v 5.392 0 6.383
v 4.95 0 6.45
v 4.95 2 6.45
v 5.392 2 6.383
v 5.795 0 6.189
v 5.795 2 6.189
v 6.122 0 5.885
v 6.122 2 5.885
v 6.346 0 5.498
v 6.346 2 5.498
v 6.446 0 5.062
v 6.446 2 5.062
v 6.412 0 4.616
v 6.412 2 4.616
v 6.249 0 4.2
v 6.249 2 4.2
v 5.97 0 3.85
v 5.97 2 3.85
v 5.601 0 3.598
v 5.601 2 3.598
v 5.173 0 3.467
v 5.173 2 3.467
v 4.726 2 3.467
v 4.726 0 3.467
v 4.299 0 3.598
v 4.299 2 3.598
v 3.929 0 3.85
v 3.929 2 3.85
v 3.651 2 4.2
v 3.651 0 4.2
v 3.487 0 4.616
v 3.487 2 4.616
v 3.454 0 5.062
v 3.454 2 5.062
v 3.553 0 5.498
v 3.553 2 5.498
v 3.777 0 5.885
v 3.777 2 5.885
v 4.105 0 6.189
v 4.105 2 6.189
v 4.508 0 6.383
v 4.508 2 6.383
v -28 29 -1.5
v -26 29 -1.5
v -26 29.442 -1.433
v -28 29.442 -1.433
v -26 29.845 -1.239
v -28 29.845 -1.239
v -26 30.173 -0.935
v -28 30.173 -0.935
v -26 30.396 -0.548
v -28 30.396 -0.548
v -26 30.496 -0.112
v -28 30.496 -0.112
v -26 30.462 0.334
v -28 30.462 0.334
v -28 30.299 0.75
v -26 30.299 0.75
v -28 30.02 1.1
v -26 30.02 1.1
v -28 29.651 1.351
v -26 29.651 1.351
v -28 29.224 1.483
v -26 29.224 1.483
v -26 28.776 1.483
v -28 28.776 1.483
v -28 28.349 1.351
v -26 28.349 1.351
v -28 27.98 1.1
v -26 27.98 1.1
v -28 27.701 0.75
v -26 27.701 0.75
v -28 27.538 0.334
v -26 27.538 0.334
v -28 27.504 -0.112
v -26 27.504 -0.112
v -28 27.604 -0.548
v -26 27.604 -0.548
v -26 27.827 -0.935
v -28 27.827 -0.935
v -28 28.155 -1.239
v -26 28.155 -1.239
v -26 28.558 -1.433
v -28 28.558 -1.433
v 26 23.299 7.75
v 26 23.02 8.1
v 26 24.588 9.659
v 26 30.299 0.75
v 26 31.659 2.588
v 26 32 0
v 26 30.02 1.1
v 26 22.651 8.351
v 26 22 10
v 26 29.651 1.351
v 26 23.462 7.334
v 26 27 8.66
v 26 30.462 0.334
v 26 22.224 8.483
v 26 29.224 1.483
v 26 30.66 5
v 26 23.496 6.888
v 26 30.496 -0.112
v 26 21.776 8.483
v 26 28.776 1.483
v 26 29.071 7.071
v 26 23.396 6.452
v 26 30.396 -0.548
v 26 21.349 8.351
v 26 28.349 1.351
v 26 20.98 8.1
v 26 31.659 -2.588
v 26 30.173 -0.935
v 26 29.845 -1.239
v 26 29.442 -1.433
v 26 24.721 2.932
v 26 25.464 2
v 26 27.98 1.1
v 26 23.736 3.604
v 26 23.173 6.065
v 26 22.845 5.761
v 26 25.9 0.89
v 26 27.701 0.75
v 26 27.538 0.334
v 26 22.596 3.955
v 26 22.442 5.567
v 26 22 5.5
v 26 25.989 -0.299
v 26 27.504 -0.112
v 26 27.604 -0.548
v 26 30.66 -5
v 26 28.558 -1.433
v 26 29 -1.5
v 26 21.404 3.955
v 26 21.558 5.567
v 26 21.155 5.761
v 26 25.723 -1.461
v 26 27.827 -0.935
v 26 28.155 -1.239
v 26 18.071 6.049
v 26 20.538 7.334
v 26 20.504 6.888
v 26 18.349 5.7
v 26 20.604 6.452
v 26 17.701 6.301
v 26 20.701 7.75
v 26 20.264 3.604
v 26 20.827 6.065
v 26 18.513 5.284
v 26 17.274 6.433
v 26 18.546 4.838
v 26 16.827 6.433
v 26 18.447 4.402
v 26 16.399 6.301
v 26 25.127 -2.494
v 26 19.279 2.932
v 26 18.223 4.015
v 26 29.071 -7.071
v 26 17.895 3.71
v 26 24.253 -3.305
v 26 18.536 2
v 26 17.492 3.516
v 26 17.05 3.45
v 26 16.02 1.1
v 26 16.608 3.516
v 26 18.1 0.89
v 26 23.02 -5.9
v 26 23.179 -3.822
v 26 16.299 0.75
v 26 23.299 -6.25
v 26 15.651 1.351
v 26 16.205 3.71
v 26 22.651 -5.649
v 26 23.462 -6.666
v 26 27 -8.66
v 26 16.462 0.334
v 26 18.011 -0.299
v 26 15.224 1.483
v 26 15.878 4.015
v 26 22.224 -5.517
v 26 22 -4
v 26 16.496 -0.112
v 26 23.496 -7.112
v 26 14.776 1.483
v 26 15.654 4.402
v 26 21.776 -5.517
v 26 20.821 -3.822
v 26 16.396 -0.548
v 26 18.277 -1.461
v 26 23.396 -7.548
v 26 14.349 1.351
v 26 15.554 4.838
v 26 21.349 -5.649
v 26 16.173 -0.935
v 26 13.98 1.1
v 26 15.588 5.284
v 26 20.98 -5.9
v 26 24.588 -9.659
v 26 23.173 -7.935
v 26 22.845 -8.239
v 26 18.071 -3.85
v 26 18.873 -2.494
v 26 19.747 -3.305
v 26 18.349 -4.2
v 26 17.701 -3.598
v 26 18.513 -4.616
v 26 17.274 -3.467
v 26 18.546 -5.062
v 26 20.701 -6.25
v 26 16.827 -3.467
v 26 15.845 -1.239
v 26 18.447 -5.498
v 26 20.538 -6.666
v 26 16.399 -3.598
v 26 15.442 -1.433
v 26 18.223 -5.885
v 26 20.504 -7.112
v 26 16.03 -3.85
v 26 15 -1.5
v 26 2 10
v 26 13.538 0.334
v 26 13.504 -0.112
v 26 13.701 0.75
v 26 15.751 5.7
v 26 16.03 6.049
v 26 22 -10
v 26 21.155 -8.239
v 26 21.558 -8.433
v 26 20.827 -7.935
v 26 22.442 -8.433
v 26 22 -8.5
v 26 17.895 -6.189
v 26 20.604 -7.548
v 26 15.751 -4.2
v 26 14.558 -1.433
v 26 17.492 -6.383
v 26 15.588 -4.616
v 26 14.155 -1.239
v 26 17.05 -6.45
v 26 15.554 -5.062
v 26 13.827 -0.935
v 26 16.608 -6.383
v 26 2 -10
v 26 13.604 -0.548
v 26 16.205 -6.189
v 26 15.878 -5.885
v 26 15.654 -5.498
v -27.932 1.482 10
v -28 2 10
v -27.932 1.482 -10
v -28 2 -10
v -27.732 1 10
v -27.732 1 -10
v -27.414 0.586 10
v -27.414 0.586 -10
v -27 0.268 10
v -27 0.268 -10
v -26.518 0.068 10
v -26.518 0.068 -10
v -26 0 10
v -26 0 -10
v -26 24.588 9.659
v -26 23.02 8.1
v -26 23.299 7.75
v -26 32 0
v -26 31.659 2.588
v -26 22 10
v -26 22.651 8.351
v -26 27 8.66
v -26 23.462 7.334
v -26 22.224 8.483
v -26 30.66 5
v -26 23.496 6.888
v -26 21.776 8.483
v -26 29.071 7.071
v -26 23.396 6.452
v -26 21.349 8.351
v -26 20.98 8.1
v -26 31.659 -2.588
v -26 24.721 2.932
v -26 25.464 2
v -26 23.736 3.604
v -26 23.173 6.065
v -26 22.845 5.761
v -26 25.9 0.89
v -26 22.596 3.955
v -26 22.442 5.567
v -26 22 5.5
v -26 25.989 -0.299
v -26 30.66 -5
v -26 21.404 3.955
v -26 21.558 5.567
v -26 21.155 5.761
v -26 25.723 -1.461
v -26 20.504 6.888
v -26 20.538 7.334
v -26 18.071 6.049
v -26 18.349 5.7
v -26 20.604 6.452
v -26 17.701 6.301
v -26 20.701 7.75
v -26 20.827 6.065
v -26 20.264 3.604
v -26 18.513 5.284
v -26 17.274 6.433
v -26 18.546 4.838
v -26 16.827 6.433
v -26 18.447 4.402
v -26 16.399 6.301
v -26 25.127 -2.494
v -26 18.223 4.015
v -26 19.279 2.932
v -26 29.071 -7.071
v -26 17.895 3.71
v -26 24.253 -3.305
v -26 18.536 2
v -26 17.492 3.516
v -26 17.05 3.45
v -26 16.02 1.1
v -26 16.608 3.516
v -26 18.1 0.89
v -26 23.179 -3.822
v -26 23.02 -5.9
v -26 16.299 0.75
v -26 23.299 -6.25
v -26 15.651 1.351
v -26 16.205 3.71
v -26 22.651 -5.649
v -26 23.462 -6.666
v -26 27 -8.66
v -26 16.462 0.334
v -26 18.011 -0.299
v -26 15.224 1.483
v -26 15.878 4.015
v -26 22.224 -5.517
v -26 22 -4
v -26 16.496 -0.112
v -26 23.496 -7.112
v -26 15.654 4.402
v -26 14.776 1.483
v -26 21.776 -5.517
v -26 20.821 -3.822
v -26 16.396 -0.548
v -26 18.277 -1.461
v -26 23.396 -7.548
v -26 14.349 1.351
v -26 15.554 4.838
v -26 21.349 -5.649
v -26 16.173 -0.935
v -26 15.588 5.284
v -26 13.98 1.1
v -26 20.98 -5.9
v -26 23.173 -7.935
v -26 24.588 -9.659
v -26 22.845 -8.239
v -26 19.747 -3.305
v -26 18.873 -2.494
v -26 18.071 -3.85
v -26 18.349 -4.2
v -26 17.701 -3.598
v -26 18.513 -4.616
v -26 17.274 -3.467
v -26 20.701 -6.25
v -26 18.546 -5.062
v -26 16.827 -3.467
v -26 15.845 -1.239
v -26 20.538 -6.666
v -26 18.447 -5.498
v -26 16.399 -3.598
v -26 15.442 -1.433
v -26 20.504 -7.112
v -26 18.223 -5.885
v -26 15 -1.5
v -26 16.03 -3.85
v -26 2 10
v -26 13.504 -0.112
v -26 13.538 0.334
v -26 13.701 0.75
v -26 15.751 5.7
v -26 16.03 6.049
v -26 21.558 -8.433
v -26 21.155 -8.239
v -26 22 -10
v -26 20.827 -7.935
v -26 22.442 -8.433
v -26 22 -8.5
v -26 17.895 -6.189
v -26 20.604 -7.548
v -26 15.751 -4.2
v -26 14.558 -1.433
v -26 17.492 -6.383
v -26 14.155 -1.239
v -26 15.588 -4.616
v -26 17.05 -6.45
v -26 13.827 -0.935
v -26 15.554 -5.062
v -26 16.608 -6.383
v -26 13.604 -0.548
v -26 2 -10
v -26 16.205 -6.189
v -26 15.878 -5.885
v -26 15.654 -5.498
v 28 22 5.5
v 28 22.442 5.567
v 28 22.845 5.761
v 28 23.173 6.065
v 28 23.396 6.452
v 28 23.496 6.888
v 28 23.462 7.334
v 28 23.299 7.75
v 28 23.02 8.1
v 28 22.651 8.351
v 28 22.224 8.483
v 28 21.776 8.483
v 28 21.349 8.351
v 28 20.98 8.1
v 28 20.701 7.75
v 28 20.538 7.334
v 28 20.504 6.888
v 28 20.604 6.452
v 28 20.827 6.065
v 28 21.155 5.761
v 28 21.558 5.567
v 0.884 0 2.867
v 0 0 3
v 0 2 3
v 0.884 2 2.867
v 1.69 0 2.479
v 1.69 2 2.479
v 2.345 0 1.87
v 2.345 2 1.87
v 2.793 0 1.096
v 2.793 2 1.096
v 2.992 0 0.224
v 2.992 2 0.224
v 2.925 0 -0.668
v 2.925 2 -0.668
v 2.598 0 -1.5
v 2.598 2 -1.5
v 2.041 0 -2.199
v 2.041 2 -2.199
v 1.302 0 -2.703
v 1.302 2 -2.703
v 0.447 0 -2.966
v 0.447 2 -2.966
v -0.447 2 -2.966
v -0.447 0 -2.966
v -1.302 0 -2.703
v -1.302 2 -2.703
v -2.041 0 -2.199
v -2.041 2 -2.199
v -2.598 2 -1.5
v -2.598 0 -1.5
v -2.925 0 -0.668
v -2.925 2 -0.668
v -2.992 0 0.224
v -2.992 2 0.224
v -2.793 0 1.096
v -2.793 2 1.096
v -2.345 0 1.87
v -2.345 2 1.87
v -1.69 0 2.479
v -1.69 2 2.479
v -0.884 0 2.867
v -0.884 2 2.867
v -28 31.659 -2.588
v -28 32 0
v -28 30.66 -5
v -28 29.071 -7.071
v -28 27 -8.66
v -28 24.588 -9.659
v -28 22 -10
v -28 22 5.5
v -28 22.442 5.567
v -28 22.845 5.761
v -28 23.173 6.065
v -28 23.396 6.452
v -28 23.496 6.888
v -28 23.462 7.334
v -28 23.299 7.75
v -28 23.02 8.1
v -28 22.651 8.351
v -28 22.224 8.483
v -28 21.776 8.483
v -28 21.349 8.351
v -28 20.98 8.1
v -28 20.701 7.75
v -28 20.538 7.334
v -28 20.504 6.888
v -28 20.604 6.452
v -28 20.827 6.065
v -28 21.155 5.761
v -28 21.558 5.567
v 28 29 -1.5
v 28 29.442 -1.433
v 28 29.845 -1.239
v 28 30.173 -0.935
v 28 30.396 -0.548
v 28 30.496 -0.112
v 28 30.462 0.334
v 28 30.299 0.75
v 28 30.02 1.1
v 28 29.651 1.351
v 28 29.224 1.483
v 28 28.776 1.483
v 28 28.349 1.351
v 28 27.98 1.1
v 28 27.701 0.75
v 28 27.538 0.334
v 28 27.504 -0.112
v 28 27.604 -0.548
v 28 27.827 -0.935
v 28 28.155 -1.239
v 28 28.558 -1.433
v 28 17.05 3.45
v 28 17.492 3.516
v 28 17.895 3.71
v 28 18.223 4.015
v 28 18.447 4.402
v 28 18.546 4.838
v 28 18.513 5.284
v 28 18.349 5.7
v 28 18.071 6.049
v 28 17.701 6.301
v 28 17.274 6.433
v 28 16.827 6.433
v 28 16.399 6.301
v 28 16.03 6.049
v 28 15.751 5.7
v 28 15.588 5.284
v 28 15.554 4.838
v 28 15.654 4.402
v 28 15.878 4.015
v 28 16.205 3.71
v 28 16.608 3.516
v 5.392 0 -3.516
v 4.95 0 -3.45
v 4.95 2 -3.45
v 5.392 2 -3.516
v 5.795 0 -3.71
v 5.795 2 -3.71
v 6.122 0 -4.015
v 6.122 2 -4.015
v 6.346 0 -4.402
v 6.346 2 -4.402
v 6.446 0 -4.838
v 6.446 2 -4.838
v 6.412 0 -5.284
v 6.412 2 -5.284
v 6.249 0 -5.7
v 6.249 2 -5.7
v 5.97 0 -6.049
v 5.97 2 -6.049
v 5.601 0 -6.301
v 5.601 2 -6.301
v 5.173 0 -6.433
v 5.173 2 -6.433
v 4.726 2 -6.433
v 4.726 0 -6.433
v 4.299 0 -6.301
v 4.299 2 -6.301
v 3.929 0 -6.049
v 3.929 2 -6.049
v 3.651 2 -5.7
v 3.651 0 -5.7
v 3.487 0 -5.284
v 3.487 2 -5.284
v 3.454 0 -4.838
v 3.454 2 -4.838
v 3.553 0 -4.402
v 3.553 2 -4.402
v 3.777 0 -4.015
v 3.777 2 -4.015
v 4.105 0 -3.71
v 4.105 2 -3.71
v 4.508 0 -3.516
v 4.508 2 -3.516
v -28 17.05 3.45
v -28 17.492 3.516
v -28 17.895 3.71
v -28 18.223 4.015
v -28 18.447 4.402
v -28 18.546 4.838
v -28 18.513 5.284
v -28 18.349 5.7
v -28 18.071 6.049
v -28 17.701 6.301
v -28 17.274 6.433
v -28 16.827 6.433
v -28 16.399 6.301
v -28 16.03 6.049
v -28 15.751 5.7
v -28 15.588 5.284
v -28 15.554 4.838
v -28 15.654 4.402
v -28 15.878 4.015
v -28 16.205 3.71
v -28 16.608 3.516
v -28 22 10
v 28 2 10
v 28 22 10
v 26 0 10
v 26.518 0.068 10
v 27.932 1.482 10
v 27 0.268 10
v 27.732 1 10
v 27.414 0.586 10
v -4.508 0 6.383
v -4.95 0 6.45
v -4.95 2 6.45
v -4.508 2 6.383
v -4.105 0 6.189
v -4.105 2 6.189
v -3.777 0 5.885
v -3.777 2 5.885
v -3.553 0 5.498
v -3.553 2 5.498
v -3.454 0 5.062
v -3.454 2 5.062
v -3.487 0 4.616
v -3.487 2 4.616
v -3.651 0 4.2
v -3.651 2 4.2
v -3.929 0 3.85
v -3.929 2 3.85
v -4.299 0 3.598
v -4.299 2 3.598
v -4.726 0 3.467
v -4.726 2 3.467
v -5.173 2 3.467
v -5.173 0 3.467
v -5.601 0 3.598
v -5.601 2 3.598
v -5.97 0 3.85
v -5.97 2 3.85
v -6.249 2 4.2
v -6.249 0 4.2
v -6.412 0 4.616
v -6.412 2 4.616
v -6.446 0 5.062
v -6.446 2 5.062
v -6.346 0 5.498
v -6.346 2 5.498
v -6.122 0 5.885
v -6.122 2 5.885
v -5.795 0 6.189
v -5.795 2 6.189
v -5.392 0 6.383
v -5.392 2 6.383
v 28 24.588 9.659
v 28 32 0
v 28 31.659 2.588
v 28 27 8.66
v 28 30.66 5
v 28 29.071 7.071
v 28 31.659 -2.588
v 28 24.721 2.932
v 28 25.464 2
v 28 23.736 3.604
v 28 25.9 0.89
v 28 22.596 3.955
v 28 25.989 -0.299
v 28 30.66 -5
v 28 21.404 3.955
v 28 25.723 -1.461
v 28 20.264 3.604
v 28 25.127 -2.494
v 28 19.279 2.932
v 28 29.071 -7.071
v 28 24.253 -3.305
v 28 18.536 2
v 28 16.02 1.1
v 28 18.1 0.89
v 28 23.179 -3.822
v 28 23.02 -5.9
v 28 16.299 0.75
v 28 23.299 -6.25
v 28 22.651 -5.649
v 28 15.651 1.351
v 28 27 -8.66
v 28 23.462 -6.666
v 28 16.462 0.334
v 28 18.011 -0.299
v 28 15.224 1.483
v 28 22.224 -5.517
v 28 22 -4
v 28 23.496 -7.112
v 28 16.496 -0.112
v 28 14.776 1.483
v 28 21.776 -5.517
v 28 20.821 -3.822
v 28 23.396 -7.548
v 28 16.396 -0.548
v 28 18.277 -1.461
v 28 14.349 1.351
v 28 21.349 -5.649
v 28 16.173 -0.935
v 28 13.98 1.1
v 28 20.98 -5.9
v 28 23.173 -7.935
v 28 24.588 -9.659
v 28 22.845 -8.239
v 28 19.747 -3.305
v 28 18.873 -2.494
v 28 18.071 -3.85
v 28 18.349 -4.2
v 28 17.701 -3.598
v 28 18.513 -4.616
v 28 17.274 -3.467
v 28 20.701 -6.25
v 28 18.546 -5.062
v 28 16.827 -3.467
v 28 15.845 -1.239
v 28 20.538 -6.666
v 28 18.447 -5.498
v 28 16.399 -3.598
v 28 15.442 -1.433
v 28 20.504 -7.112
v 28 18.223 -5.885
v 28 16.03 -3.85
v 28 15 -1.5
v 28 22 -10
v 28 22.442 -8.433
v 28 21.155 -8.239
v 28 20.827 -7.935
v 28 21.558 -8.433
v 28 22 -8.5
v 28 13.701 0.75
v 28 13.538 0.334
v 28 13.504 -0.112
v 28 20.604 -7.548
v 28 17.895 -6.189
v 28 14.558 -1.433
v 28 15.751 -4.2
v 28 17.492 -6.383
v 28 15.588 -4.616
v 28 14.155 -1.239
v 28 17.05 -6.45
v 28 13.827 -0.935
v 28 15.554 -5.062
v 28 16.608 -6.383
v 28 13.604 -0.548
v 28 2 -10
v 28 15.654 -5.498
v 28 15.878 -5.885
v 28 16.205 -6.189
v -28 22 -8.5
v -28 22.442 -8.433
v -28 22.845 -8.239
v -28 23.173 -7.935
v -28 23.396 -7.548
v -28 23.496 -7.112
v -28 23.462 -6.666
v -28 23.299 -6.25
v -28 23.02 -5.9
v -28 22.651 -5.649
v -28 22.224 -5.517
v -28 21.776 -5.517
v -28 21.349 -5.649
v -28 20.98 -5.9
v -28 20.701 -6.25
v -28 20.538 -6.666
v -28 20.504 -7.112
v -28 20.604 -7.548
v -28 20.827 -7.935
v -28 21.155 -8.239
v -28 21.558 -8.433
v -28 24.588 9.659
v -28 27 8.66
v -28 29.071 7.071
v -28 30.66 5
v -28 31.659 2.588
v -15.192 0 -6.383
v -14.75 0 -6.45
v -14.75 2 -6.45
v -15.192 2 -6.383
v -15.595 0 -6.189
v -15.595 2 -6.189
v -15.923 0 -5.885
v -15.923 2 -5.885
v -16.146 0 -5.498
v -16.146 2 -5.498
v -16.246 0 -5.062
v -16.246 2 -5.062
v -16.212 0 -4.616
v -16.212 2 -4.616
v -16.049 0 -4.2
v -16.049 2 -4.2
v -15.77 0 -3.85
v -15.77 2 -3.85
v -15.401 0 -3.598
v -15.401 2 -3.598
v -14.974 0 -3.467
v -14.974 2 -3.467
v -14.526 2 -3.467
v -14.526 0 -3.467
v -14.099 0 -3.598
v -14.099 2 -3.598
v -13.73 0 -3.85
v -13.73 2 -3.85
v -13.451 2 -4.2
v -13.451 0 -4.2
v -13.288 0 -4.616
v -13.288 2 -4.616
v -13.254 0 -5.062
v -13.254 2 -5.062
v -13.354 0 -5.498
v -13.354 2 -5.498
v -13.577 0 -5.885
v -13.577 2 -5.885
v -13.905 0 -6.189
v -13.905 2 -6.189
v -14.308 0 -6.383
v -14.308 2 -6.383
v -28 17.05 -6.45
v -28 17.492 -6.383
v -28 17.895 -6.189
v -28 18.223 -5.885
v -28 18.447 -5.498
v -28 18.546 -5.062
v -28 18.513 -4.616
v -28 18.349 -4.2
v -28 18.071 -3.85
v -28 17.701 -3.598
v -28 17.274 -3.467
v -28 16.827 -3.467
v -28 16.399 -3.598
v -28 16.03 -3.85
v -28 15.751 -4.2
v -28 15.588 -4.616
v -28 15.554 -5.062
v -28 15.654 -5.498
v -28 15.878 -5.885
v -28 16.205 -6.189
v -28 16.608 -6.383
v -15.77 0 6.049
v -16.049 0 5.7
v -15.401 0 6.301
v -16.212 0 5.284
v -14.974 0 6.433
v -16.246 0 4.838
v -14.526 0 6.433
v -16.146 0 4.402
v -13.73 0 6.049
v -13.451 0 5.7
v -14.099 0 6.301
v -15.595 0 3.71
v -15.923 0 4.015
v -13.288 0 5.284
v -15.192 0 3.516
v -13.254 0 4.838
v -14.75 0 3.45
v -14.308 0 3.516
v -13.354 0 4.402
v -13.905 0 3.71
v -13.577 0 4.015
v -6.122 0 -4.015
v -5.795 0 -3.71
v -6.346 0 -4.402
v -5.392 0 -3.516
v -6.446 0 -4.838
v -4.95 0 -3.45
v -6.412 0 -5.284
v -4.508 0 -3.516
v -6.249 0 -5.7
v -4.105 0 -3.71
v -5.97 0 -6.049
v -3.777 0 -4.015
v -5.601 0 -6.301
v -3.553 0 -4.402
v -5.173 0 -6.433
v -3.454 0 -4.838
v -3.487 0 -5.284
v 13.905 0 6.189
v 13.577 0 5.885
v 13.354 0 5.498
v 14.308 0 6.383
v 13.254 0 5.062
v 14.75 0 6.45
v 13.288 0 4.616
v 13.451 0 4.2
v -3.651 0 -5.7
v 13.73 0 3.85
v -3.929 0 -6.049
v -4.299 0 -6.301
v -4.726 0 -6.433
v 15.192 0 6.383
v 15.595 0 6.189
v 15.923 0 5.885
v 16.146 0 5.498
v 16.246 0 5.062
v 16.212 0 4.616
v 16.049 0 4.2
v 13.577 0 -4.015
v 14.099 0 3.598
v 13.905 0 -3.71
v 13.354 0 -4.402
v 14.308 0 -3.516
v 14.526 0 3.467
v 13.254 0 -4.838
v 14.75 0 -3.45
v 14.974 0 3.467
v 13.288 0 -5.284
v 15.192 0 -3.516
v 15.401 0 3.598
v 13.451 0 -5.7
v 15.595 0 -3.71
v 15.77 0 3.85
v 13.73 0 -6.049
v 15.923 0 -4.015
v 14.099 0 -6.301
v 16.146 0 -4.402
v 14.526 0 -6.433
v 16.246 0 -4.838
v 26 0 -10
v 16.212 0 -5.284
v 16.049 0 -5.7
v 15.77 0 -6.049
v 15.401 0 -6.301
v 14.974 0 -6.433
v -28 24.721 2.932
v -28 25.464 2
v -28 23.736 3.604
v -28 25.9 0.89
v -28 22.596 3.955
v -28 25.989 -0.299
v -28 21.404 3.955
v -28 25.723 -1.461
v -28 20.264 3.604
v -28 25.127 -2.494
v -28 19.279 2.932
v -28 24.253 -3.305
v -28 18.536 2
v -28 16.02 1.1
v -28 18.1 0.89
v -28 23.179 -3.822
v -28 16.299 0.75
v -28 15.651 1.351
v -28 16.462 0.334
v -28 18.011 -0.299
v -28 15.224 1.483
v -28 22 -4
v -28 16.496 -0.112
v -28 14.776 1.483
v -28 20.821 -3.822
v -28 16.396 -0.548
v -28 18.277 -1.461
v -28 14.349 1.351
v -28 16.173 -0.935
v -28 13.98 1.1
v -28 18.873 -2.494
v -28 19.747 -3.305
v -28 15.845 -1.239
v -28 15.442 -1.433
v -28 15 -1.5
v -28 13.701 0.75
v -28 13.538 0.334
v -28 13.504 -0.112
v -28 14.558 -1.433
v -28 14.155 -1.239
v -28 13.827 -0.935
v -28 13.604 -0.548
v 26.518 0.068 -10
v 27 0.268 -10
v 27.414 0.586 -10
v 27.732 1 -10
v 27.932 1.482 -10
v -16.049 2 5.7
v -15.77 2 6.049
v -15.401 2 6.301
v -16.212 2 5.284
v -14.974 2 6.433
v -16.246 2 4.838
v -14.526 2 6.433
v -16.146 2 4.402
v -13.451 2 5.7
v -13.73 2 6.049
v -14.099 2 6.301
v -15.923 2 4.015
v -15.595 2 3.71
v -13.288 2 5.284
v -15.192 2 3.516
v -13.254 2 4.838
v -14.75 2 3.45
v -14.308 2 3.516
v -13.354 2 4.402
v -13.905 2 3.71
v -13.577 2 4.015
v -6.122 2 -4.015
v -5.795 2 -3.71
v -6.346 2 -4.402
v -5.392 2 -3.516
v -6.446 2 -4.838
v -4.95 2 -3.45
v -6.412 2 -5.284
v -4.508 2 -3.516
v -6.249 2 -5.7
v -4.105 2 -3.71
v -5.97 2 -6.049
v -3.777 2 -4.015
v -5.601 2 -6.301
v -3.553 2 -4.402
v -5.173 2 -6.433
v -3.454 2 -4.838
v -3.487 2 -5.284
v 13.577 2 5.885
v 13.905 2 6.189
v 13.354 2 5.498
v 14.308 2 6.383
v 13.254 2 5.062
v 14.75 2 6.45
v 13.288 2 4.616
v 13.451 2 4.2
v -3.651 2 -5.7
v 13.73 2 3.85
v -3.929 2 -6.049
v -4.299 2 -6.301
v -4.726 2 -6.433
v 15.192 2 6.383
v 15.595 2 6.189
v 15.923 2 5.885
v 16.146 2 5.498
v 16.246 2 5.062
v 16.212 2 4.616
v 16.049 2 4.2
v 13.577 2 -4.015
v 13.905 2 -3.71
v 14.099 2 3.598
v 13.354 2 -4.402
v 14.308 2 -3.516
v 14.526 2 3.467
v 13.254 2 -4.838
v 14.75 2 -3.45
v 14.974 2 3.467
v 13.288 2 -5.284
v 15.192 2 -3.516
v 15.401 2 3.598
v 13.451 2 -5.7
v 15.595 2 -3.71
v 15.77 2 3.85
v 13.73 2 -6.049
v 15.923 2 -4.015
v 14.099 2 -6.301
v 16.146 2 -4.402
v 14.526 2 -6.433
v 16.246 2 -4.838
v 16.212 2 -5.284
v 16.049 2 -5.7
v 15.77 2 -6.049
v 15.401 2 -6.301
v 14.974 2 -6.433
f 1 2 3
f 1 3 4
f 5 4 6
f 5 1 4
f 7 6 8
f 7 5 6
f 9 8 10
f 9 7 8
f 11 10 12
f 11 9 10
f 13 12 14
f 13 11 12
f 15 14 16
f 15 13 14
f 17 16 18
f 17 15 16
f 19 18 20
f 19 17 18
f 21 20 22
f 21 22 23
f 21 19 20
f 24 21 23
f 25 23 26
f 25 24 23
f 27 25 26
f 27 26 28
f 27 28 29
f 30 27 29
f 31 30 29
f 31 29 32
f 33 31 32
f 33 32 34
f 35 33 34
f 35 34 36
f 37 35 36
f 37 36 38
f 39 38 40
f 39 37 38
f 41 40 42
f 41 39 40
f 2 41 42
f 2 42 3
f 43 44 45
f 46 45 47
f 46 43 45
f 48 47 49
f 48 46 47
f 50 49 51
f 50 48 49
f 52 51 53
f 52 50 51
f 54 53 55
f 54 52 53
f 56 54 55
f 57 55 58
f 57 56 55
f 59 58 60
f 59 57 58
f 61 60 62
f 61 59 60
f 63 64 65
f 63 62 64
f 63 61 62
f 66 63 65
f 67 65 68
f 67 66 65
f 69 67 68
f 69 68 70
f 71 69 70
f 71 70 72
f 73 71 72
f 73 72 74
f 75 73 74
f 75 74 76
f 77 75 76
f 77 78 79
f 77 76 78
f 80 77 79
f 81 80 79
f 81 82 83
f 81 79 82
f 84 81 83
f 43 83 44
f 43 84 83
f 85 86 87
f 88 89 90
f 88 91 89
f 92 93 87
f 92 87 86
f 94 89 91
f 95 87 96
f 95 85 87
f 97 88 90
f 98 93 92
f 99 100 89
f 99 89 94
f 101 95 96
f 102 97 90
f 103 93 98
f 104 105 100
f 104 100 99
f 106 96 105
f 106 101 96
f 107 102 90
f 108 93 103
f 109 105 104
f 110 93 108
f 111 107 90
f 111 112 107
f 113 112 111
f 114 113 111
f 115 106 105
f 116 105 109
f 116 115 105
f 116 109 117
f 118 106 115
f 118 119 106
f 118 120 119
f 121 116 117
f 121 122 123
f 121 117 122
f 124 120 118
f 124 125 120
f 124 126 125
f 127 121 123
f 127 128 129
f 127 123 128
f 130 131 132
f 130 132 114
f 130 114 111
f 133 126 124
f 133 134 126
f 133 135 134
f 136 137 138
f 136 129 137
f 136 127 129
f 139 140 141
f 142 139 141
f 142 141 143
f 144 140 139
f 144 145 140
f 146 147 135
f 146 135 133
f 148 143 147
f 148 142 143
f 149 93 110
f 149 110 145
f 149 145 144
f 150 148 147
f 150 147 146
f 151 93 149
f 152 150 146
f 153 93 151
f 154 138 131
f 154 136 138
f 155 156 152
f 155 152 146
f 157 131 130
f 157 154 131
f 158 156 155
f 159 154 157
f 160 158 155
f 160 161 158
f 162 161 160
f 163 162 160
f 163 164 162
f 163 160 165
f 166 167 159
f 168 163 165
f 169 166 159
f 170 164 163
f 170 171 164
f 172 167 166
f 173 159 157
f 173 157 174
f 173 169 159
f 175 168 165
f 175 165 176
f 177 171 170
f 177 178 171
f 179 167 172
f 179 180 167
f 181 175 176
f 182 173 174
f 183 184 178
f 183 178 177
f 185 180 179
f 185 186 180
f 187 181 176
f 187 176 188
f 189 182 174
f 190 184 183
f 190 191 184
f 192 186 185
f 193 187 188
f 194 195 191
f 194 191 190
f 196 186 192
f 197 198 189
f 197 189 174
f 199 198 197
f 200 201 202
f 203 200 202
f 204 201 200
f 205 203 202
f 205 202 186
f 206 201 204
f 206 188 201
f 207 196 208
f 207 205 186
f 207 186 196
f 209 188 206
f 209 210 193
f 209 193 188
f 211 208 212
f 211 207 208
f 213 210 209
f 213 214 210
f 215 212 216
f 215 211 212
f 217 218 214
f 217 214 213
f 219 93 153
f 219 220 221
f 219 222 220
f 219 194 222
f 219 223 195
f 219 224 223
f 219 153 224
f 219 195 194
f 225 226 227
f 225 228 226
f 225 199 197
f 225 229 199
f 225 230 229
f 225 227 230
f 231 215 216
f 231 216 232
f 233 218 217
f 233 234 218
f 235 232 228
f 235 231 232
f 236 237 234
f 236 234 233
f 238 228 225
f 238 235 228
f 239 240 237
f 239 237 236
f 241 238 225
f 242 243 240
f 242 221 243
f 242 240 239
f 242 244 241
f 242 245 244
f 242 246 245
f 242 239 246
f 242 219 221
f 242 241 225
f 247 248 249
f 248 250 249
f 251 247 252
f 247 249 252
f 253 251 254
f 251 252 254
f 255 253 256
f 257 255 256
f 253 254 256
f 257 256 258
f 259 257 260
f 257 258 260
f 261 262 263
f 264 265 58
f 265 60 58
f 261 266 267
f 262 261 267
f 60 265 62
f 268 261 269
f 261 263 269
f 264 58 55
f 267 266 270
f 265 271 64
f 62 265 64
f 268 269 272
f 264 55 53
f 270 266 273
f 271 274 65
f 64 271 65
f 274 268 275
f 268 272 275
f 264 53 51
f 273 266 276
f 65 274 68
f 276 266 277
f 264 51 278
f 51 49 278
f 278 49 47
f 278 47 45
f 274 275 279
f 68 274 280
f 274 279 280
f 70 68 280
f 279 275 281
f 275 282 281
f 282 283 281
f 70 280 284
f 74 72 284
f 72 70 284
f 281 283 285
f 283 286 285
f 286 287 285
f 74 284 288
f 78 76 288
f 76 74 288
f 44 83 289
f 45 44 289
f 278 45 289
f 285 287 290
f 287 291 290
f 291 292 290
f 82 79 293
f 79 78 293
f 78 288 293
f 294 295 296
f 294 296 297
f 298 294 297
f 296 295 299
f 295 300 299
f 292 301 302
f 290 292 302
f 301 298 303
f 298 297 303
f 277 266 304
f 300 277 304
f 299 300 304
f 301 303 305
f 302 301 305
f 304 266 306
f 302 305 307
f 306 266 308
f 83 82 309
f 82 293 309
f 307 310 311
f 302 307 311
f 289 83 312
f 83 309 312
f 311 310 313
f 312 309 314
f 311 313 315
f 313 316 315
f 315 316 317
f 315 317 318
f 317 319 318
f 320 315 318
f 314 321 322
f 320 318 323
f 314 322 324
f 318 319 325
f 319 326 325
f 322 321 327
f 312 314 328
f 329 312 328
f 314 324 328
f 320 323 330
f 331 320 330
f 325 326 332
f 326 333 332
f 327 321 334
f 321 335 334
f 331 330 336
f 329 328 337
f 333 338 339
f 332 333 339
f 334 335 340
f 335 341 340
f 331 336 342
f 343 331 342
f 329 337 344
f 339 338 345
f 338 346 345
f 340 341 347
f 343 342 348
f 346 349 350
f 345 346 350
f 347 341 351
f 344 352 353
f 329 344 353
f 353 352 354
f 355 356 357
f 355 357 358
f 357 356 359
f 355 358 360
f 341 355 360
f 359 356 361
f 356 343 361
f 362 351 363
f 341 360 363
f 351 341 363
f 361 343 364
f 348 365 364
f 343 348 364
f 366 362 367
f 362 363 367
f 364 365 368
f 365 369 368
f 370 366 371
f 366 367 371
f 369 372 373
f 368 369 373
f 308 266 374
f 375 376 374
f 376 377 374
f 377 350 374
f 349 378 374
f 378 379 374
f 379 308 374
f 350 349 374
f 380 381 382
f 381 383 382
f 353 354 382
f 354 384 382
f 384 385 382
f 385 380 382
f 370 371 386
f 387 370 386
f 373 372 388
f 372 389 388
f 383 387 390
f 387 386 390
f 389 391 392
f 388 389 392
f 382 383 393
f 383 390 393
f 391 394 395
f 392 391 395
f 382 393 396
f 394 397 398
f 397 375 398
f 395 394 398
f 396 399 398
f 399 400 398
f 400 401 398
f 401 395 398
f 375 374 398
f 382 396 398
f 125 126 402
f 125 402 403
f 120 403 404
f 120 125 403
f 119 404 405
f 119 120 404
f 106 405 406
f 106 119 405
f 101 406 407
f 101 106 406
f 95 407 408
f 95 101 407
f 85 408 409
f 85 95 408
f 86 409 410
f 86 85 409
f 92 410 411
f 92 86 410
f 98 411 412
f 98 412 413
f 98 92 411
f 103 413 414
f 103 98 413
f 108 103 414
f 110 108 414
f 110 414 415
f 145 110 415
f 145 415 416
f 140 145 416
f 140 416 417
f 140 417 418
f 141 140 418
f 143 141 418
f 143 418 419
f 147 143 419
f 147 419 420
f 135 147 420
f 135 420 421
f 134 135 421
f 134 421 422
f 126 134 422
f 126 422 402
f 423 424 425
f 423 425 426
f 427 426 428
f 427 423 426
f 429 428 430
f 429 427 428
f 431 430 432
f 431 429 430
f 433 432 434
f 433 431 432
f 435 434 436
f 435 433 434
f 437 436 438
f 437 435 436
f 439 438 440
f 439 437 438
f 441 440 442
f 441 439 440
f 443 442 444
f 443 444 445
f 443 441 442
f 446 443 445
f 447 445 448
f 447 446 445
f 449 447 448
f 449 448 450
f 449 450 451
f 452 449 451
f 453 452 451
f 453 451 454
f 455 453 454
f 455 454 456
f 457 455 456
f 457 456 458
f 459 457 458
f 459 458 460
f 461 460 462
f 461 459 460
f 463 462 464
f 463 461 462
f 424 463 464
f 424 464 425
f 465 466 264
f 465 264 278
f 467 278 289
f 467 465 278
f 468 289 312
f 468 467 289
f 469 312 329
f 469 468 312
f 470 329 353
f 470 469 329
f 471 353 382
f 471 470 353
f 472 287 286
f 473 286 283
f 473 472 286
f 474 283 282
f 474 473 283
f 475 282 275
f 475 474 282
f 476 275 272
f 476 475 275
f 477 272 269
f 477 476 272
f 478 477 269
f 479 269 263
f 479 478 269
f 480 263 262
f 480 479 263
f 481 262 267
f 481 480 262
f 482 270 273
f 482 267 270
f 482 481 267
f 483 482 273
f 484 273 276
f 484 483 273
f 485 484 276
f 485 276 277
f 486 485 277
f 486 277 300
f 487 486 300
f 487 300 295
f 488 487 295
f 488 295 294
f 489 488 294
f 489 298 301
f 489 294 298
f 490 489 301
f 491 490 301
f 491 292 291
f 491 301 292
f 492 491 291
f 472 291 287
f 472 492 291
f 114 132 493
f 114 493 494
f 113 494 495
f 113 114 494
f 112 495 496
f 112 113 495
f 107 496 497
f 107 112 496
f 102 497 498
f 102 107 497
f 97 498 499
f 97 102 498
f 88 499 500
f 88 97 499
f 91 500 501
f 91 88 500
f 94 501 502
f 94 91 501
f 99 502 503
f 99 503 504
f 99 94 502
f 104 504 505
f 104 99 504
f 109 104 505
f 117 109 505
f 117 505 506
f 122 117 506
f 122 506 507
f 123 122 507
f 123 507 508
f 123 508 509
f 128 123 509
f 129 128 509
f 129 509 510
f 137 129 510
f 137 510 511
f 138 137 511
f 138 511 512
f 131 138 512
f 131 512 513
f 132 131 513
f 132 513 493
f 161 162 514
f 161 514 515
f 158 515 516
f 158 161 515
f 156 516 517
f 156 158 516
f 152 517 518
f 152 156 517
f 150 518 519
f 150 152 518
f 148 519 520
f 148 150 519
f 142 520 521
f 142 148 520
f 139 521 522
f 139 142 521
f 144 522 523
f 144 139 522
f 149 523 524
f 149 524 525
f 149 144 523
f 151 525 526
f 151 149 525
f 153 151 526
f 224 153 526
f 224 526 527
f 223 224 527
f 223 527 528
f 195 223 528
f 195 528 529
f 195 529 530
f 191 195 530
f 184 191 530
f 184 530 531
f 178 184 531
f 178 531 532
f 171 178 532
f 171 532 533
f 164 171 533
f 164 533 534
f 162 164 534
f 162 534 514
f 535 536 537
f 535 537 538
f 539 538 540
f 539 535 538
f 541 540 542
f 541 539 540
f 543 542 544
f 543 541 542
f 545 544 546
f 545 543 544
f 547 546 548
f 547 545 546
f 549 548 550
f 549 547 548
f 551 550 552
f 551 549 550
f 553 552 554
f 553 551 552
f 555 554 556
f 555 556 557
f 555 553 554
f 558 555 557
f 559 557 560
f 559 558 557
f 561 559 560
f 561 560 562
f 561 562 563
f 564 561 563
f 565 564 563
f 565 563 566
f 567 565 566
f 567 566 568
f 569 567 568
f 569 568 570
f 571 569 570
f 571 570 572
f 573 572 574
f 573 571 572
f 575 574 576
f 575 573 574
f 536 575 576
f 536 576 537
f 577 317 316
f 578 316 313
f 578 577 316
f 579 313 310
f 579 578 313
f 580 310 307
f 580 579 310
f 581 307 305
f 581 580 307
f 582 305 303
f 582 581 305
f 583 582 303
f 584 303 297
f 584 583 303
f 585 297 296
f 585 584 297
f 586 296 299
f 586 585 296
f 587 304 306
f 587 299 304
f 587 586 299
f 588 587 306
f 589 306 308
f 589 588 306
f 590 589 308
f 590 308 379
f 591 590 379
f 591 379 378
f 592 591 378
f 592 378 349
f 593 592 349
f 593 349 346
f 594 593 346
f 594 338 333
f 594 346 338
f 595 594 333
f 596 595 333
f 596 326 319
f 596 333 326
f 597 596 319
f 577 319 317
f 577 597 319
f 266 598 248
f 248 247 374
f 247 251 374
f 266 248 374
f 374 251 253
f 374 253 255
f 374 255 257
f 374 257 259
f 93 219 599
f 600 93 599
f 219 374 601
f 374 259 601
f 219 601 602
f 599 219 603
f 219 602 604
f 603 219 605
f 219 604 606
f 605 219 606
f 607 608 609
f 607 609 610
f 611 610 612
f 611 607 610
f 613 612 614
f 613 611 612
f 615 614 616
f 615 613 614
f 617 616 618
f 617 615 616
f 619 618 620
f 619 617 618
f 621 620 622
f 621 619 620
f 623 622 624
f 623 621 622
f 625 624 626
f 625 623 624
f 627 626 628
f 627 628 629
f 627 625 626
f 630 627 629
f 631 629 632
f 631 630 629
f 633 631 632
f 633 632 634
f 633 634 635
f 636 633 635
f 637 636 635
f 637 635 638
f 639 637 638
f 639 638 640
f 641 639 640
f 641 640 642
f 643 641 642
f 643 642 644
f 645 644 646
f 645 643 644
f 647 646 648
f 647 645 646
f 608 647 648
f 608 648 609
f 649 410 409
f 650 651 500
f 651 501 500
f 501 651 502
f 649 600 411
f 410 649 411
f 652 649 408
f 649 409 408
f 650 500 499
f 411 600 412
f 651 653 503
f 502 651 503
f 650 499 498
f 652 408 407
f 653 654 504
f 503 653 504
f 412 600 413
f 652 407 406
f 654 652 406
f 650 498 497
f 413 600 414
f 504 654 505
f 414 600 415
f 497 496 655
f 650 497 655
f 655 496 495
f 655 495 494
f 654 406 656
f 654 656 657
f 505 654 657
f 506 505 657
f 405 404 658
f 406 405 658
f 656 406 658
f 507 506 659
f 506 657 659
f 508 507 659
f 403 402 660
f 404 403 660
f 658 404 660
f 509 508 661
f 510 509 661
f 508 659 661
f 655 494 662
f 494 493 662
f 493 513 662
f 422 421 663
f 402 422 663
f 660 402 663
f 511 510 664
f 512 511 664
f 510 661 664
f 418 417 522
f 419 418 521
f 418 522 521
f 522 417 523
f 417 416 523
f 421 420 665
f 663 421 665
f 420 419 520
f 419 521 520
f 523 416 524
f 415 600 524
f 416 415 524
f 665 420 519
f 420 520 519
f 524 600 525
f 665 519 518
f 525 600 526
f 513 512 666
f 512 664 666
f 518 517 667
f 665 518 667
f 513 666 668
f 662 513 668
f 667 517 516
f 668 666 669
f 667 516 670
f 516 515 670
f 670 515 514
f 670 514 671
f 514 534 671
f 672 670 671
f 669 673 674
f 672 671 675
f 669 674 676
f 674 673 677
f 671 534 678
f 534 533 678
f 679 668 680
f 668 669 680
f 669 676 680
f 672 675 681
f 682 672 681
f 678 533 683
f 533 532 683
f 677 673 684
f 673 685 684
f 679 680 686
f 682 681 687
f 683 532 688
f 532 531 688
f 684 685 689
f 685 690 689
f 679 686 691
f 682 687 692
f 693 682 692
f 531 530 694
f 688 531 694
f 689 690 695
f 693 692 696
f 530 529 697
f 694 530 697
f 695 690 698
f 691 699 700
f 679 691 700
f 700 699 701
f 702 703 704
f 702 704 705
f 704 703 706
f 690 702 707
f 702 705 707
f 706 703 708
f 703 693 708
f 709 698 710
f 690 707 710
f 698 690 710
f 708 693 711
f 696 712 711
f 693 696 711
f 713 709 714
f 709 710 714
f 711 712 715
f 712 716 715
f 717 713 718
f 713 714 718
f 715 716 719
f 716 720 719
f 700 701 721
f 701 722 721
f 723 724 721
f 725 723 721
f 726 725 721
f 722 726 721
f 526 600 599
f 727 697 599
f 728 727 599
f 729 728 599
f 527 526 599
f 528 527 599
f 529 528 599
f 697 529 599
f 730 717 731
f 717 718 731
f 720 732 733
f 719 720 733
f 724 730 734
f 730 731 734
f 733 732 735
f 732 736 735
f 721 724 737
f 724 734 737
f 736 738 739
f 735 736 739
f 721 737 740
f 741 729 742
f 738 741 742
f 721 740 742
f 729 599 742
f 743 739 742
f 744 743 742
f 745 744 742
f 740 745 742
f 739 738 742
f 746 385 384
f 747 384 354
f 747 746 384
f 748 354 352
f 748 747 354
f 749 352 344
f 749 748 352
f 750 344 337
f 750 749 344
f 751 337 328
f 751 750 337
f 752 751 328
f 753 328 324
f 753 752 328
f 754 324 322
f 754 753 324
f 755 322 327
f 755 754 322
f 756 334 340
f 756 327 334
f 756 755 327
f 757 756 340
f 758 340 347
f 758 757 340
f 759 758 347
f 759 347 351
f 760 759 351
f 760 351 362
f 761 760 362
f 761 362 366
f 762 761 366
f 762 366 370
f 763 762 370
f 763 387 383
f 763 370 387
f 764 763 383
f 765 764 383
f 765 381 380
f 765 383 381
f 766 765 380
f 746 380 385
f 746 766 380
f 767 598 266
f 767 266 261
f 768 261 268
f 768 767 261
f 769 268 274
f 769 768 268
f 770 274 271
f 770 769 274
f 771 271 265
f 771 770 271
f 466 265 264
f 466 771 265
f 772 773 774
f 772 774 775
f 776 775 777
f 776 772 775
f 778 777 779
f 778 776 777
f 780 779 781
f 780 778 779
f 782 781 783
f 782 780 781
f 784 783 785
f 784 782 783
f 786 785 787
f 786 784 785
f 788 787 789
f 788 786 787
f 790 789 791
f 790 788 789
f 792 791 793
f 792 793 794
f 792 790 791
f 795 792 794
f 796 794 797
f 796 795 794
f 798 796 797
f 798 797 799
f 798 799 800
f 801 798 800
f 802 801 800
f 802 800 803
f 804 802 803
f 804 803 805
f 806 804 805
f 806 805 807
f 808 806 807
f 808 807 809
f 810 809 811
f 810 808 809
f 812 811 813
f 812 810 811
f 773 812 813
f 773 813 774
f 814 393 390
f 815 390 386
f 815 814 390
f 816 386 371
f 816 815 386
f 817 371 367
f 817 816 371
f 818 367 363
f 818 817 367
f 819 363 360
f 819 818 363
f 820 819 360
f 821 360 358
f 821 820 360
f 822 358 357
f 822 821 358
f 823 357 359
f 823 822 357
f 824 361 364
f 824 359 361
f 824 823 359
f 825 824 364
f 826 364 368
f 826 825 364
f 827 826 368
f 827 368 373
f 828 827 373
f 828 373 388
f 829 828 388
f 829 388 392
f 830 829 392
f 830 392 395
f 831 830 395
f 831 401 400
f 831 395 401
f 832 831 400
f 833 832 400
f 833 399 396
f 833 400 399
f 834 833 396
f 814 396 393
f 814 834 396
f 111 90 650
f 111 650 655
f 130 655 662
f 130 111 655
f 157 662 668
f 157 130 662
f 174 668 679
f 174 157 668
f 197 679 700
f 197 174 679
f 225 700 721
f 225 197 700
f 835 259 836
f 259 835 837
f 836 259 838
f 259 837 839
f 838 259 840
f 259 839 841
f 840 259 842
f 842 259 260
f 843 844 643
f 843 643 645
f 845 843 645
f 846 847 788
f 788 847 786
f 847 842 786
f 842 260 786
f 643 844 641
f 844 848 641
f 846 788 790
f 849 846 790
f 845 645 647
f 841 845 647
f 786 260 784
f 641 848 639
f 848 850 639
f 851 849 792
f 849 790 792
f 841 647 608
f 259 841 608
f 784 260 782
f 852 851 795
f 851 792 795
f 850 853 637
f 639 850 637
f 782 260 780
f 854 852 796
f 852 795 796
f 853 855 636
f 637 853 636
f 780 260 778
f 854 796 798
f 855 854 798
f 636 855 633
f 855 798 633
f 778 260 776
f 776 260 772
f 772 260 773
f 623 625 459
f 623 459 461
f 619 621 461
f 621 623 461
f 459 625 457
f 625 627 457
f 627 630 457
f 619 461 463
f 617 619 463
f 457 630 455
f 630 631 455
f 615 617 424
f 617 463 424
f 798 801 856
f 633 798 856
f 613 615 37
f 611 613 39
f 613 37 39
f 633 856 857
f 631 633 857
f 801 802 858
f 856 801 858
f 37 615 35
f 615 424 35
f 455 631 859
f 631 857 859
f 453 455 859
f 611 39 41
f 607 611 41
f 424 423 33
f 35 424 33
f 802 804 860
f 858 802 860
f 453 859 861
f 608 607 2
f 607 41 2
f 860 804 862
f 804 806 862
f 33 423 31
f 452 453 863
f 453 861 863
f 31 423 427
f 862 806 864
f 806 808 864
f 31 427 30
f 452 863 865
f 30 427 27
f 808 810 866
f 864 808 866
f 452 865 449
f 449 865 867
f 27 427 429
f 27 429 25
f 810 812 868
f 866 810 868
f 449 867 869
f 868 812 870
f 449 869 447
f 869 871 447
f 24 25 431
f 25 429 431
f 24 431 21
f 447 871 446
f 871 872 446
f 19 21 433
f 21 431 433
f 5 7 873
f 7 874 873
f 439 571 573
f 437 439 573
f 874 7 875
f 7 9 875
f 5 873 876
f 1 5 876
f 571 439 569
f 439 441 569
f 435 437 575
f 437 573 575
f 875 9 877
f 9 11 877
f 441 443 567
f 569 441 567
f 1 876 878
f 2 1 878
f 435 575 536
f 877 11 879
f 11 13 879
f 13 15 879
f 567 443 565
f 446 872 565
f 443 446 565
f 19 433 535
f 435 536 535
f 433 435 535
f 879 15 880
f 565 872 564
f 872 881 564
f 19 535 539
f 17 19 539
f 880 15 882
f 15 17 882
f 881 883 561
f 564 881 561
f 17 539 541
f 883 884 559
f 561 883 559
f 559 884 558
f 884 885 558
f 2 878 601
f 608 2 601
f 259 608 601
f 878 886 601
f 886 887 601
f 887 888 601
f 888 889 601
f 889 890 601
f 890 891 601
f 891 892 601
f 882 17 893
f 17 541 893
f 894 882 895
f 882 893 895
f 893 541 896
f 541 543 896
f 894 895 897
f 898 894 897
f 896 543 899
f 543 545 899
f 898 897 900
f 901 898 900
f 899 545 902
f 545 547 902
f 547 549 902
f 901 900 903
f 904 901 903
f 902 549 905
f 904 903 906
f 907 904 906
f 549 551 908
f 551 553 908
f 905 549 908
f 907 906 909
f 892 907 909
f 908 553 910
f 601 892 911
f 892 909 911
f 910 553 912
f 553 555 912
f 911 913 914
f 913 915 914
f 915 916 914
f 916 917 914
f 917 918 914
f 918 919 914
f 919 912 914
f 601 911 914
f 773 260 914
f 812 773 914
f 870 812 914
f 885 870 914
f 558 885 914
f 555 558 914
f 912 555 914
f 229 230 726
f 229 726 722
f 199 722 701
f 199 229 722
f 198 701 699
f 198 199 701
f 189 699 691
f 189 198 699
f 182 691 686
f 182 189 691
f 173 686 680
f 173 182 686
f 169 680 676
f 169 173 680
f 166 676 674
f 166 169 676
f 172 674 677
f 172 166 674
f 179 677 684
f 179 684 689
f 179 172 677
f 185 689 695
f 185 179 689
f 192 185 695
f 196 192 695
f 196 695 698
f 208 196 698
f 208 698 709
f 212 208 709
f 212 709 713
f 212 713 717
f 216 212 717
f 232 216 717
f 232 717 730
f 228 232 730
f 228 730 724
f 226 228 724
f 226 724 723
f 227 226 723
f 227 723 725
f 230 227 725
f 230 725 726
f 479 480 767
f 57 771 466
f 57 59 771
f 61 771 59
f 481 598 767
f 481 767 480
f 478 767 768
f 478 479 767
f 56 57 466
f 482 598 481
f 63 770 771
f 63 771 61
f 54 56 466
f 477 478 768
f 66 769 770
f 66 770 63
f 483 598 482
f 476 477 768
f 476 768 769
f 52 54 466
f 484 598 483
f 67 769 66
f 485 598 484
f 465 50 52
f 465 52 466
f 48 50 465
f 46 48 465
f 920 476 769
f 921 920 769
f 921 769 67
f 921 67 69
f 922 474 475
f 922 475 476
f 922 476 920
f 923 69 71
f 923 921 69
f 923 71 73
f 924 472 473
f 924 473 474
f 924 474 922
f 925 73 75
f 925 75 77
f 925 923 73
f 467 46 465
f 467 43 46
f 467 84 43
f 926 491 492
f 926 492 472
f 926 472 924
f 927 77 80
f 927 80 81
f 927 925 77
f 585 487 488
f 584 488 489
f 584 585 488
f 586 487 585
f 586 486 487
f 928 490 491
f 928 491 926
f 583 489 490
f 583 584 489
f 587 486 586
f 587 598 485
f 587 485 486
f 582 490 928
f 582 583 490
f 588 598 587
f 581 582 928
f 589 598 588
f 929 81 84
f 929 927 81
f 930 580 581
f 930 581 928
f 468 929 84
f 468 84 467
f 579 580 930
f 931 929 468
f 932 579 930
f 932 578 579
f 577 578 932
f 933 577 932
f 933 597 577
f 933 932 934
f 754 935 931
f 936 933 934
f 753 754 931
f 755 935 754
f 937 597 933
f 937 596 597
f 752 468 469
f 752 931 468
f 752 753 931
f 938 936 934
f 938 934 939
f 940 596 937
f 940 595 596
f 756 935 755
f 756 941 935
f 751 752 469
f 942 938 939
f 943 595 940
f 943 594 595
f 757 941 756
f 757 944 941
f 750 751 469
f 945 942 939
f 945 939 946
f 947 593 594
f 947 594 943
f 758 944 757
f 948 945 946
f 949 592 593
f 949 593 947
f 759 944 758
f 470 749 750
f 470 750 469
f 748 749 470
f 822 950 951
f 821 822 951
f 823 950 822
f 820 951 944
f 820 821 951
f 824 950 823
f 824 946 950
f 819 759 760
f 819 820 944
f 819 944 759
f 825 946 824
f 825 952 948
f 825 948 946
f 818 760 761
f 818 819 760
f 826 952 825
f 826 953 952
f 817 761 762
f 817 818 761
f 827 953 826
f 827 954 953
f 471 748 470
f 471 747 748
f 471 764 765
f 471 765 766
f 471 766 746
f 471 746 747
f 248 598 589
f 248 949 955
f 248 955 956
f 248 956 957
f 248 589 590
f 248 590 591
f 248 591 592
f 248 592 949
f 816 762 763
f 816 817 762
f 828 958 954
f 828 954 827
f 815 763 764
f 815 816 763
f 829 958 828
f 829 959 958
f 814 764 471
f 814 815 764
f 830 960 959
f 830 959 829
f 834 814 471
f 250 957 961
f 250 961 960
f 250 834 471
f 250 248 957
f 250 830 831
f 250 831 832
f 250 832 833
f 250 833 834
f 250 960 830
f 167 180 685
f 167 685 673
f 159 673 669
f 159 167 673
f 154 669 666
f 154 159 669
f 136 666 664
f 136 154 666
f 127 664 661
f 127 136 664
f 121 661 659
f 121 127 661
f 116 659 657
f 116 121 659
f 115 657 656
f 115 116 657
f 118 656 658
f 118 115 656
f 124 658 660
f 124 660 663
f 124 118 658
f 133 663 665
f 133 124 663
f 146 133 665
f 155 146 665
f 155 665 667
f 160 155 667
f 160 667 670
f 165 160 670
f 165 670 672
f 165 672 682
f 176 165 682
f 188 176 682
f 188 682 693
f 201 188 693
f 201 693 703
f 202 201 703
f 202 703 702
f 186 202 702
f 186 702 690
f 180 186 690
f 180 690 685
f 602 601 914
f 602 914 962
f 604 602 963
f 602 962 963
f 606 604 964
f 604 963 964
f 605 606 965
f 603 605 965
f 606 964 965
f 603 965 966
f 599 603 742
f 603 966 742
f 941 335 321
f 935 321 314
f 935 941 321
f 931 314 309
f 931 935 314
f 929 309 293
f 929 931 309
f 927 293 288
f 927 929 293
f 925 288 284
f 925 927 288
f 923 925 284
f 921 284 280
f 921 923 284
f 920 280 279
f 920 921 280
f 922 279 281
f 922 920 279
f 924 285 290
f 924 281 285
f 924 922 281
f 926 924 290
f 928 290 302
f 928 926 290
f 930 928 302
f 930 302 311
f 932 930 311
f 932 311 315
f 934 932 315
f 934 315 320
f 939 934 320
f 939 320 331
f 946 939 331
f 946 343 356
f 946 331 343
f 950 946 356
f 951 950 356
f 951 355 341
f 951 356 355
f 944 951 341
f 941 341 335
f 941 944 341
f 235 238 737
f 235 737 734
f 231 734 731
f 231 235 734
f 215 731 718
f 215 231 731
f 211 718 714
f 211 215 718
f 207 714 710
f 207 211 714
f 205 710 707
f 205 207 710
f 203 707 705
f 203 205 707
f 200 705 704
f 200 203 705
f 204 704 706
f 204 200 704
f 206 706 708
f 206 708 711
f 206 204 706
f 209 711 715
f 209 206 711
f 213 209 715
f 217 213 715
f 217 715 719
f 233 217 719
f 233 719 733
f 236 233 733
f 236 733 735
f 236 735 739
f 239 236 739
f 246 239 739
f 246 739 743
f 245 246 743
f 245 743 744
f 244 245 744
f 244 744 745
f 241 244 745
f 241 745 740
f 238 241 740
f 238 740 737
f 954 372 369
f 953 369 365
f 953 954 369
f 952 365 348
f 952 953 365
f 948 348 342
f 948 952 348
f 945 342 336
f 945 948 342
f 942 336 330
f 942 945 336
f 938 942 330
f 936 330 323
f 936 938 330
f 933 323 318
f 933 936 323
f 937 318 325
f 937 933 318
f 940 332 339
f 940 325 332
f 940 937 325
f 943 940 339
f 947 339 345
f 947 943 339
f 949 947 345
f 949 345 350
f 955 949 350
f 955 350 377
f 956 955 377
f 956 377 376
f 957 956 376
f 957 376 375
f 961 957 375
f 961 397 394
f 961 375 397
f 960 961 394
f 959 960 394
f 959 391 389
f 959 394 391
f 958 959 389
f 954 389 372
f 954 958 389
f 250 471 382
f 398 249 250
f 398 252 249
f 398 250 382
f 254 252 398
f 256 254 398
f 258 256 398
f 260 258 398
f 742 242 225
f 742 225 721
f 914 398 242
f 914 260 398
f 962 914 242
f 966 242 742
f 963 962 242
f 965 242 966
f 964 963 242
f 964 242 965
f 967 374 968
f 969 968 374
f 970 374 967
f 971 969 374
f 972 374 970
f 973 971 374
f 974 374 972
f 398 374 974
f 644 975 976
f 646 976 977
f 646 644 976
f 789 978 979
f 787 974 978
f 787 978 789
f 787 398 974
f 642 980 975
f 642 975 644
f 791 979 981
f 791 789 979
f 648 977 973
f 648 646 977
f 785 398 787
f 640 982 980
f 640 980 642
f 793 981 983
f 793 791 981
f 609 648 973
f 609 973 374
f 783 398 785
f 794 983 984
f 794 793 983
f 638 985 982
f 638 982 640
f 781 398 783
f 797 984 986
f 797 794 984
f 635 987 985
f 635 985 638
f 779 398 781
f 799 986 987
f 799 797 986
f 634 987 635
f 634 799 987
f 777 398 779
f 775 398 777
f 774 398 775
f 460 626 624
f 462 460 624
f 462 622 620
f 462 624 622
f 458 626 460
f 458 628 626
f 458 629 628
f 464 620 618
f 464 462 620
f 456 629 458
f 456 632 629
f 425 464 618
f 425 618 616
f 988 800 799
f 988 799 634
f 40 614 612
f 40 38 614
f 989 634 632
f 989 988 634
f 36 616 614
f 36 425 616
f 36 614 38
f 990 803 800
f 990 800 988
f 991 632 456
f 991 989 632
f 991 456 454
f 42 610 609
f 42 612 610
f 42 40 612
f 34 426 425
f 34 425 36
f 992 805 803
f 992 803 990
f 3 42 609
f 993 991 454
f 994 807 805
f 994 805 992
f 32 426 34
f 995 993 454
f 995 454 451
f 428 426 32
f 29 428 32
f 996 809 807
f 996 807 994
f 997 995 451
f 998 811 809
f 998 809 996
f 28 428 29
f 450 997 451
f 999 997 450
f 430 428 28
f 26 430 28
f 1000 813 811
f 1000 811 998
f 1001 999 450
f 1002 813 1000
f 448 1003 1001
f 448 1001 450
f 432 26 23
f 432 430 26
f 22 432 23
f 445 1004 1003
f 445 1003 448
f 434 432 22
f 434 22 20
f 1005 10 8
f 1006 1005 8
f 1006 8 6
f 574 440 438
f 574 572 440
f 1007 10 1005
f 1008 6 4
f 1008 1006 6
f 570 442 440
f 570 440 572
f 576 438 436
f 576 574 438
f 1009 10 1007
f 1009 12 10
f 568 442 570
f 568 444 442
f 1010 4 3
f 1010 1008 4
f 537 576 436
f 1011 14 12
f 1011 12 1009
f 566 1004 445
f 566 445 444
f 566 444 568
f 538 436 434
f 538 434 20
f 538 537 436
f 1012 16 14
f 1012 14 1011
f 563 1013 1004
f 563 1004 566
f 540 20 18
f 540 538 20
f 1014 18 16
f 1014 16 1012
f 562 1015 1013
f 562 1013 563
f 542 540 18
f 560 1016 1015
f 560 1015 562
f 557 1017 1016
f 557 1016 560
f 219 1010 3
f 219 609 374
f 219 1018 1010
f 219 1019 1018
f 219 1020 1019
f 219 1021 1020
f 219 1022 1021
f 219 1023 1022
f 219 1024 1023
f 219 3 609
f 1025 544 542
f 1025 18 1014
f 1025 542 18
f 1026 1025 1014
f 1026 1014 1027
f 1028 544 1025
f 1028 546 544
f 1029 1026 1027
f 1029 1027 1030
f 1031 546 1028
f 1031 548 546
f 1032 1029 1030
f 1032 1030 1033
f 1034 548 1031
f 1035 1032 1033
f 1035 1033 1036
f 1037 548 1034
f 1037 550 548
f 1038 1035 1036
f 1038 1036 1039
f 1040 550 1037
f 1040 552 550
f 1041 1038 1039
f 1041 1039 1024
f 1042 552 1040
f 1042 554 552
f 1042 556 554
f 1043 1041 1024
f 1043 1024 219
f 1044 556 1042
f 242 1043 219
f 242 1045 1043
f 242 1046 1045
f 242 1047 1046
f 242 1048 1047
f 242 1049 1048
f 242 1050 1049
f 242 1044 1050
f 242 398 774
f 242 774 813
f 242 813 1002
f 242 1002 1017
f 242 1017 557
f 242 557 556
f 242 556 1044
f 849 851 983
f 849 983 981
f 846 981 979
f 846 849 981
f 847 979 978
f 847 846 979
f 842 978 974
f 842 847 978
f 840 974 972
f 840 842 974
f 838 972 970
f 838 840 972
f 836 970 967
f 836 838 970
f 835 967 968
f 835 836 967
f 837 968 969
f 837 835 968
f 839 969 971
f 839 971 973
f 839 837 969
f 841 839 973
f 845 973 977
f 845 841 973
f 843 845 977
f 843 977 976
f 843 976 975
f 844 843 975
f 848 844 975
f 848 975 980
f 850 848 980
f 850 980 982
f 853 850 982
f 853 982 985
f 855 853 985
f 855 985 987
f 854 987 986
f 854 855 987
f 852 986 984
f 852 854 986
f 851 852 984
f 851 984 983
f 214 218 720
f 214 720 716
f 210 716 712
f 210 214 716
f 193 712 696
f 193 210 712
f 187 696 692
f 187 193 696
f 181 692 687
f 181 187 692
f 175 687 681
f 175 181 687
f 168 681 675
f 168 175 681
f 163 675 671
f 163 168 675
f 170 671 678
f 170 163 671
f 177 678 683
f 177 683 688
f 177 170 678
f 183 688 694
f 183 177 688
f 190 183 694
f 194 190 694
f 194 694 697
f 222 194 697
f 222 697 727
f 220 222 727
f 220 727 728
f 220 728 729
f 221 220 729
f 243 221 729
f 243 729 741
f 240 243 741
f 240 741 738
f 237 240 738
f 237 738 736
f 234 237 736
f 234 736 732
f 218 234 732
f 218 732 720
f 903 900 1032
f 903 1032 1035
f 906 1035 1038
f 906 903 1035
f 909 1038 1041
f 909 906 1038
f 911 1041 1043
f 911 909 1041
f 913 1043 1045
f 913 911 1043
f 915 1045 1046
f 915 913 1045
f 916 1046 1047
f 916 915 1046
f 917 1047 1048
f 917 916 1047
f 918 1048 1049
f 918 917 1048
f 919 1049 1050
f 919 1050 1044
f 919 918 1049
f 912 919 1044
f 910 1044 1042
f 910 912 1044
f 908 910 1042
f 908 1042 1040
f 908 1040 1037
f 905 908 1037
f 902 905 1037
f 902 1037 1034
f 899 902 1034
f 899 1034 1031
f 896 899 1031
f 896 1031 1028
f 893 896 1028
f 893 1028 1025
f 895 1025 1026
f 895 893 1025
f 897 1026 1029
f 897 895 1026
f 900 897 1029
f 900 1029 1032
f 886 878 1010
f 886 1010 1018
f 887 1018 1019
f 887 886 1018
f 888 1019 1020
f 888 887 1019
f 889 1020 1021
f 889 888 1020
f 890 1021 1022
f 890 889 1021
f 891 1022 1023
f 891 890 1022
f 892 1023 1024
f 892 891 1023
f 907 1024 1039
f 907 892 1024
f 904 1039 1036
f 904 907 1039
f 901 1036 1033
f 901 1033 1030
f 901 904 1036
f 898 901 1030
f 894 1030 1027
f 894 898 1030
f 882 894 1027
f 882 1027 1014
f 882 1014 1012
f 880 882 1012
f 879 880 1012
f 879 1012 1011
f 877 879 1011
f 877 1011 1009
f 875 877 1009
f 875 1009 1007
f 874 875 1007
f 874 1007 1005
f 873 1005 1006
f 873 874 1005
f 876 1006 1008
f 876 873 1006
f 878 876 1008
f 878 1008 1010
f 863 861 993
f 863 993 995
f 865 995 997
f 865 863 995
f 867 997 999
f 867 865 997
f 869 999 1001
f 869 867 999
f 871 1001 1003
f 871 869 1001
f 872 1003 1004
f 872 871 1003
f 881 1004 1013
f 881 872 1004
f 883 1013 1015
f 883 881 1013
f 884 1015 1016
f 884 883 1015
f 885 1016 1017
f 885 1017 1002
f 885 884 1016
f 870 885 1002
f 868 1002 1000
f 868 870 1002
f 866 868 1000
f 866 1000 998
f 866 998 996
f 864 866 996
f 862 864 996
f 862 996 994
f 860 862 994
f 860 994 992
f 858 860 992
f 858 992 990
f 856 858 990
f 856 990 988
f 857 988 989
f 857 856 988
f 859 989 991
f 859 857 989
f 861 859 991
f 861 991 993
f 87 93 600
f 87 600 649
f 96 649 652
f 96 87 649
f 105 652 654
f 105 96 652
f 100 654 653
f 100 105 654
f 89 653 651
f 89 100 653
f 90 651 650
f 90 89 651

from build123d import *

# Parameters (mm, degrees)
SKETCH_1_W                = 52
SKETCH_1_H                = 20
SKETCH_1_R                = 3
SKETCH_1_R_2              = 1.5
EXTRUDE_1_DEPTH           = 2
SKETCH_2_W                = 2
SKETCH_2_H                = 20
EXTRUDE_2_DEPTH           = 32
CUT_EXTRUDE_START         = -28
CUT_EXTRUDE_1_OUTLINE_R   = 1.5
CUT_EXTRUDE_1_OUTLINE_R_2 = 4
CUT_EXTRUDE_1_DEPTH       = 56
FILLET_1_R                = 2


# Read off the part's stored shape, not the designer's step: 切除-拉伸1
with BuildPart() as part:
    # 草图1 → 凸台-拉伸1 (new body)
    with BuildSketch(Plane(origin=(0, 0, 0), x_dir=(1, 0, 0), z_dir=(0, 1, 0))):
        Rectangle(SKETCH_1_W, SKETCH_1_H)
        with Locations(Location((0, 0, 0), (0, 0, 270))):
            Circle(SKETCH_1_R, mode=Mode.SUBTRACT)
        with Locations(Location((-4.949747468, -4.949747468, 0), (0, 0, 270))):
            Circle(SKETCH_1_R_2, mode=Mode.SUBTRACT)
        with Locations(Location((-4.949747468, 4.949747468, 0), (0, 0, 270))):
            Circle(SKETCH_1_R_2, mode=Mode.SUBTRACT)
        with Locations(Location((4.949747468, 4.949747468, 0), (0, 0, 270))):
            Circle(SKETCH_1_R_2, mode=Mode.SUBTRACT)
        with Locations(Location((4.949747468, -4.949747468, 0), (0, 0, 270))):
            Circle(SKETCH_1_R_2, mode=Mode.SUBTRACT)
        with Locations(Location((14.75, -4.949747468, 0), (0, 0, 270))):
            Circle(SKETCH_1_R_2, mode=Mode.SUBTRACT)
        with Locations(Location((14.75, 4.949747468, 0), (0, 0, 270))):
            Circle(SKETCH_1_R_2, mode=Mode.SUBTRACT)
        with Locations(Location((-14.75, -4.949747468, 0), (0, 0, 90))):
            Circle(SKETCH_1_R_2, mode=Mode.SUBTRACT)
        with Locations(Location((-14.75, 4.949747468, 0), (0, 0, 90))):
            Circle(SKETCH_1_R_2, mode=Mode.SUBTRACT)
    extrude(amount=EXTRUDE_1_DEPTH)

    # 草图2 → 凸台-拉伸2 (add)
    with BuildSketch(Plane(origin=(0, 0, 0), x_dir=(1, 0, 0), z_dir=(0, 1, 0))):
        with Locations((27, 0)):
            Rectangle(SKETCH_2_W, SKETCH_2_H)
        with Locations((-27, 0)):
            Rectangle(SKETCH_2_W, SKETCH_2_H)
    extrude(amount=EXTRUDE_2_DEPTH)

    # 切除-拉伸1 outline → 切除-拉伸1 (cut)
    with BuildSketch(Plane(origin=(0, 0, 0), x_dir=(0, 0, -1), z_dir=(1, 0, 0)).offset(CUT_EXTRUDE_START)):
        with BuildLine():
            ThreePointArc((-10, 22), (-7.071067812, 29.071067812), (0, 32))
            Line((0, 32), (-10, 32))
            Line((-10, 32), (-10, 22))
        make_face()
        with BuildLine():
            ThreePointArc((0, 32), (7.071067812, 29.071067812), (10, 22))
            Line((10, 22), (10, 32))
            Line((10, 32), (0, 32))
        make_face()
        with Locations((0, 29)):
            Circle(CUT_EXTRUDE_1_OUTLINE_R)
        with Locations((0, 15)):
            Circle(CUT_EXTRUDE_1_OUTLINE_R)
        with Locations((0, 22)):
            Circle(CUT_EXTRUDE_1_OUTLINE_R_2)
        with Locations((-7, 22)):
            Circle(CUT_EXTRUDE_1_OUTLINE_R)
        with Locations((7, 22)):
            Circle(CUT_EXTRUDE_1_OUTLINE_R)
        with Locations((-4.949747468, 17.050252532)):
            Circle(CUT_EXTRUDE_1_OUTLINE_R)
        with Locations((4.949747468, 17.050252532)):
            Circle(CUT_EXTRUDE_1_OUTLINE_R)
    extrude(amount=CUT_EXTRUDE_1_DEPTH, mode=Mode.SUBTRACT)

    # 圆角1
    fillet_1_edges = [part.edges().sort_by_distance(p)[0] for p in [
        (28, 0, 0),
        (-28, 0, 0),
    ]]
    fillet(fillet_1_edges, radius=FILLET_1_R)


solid = part.part
